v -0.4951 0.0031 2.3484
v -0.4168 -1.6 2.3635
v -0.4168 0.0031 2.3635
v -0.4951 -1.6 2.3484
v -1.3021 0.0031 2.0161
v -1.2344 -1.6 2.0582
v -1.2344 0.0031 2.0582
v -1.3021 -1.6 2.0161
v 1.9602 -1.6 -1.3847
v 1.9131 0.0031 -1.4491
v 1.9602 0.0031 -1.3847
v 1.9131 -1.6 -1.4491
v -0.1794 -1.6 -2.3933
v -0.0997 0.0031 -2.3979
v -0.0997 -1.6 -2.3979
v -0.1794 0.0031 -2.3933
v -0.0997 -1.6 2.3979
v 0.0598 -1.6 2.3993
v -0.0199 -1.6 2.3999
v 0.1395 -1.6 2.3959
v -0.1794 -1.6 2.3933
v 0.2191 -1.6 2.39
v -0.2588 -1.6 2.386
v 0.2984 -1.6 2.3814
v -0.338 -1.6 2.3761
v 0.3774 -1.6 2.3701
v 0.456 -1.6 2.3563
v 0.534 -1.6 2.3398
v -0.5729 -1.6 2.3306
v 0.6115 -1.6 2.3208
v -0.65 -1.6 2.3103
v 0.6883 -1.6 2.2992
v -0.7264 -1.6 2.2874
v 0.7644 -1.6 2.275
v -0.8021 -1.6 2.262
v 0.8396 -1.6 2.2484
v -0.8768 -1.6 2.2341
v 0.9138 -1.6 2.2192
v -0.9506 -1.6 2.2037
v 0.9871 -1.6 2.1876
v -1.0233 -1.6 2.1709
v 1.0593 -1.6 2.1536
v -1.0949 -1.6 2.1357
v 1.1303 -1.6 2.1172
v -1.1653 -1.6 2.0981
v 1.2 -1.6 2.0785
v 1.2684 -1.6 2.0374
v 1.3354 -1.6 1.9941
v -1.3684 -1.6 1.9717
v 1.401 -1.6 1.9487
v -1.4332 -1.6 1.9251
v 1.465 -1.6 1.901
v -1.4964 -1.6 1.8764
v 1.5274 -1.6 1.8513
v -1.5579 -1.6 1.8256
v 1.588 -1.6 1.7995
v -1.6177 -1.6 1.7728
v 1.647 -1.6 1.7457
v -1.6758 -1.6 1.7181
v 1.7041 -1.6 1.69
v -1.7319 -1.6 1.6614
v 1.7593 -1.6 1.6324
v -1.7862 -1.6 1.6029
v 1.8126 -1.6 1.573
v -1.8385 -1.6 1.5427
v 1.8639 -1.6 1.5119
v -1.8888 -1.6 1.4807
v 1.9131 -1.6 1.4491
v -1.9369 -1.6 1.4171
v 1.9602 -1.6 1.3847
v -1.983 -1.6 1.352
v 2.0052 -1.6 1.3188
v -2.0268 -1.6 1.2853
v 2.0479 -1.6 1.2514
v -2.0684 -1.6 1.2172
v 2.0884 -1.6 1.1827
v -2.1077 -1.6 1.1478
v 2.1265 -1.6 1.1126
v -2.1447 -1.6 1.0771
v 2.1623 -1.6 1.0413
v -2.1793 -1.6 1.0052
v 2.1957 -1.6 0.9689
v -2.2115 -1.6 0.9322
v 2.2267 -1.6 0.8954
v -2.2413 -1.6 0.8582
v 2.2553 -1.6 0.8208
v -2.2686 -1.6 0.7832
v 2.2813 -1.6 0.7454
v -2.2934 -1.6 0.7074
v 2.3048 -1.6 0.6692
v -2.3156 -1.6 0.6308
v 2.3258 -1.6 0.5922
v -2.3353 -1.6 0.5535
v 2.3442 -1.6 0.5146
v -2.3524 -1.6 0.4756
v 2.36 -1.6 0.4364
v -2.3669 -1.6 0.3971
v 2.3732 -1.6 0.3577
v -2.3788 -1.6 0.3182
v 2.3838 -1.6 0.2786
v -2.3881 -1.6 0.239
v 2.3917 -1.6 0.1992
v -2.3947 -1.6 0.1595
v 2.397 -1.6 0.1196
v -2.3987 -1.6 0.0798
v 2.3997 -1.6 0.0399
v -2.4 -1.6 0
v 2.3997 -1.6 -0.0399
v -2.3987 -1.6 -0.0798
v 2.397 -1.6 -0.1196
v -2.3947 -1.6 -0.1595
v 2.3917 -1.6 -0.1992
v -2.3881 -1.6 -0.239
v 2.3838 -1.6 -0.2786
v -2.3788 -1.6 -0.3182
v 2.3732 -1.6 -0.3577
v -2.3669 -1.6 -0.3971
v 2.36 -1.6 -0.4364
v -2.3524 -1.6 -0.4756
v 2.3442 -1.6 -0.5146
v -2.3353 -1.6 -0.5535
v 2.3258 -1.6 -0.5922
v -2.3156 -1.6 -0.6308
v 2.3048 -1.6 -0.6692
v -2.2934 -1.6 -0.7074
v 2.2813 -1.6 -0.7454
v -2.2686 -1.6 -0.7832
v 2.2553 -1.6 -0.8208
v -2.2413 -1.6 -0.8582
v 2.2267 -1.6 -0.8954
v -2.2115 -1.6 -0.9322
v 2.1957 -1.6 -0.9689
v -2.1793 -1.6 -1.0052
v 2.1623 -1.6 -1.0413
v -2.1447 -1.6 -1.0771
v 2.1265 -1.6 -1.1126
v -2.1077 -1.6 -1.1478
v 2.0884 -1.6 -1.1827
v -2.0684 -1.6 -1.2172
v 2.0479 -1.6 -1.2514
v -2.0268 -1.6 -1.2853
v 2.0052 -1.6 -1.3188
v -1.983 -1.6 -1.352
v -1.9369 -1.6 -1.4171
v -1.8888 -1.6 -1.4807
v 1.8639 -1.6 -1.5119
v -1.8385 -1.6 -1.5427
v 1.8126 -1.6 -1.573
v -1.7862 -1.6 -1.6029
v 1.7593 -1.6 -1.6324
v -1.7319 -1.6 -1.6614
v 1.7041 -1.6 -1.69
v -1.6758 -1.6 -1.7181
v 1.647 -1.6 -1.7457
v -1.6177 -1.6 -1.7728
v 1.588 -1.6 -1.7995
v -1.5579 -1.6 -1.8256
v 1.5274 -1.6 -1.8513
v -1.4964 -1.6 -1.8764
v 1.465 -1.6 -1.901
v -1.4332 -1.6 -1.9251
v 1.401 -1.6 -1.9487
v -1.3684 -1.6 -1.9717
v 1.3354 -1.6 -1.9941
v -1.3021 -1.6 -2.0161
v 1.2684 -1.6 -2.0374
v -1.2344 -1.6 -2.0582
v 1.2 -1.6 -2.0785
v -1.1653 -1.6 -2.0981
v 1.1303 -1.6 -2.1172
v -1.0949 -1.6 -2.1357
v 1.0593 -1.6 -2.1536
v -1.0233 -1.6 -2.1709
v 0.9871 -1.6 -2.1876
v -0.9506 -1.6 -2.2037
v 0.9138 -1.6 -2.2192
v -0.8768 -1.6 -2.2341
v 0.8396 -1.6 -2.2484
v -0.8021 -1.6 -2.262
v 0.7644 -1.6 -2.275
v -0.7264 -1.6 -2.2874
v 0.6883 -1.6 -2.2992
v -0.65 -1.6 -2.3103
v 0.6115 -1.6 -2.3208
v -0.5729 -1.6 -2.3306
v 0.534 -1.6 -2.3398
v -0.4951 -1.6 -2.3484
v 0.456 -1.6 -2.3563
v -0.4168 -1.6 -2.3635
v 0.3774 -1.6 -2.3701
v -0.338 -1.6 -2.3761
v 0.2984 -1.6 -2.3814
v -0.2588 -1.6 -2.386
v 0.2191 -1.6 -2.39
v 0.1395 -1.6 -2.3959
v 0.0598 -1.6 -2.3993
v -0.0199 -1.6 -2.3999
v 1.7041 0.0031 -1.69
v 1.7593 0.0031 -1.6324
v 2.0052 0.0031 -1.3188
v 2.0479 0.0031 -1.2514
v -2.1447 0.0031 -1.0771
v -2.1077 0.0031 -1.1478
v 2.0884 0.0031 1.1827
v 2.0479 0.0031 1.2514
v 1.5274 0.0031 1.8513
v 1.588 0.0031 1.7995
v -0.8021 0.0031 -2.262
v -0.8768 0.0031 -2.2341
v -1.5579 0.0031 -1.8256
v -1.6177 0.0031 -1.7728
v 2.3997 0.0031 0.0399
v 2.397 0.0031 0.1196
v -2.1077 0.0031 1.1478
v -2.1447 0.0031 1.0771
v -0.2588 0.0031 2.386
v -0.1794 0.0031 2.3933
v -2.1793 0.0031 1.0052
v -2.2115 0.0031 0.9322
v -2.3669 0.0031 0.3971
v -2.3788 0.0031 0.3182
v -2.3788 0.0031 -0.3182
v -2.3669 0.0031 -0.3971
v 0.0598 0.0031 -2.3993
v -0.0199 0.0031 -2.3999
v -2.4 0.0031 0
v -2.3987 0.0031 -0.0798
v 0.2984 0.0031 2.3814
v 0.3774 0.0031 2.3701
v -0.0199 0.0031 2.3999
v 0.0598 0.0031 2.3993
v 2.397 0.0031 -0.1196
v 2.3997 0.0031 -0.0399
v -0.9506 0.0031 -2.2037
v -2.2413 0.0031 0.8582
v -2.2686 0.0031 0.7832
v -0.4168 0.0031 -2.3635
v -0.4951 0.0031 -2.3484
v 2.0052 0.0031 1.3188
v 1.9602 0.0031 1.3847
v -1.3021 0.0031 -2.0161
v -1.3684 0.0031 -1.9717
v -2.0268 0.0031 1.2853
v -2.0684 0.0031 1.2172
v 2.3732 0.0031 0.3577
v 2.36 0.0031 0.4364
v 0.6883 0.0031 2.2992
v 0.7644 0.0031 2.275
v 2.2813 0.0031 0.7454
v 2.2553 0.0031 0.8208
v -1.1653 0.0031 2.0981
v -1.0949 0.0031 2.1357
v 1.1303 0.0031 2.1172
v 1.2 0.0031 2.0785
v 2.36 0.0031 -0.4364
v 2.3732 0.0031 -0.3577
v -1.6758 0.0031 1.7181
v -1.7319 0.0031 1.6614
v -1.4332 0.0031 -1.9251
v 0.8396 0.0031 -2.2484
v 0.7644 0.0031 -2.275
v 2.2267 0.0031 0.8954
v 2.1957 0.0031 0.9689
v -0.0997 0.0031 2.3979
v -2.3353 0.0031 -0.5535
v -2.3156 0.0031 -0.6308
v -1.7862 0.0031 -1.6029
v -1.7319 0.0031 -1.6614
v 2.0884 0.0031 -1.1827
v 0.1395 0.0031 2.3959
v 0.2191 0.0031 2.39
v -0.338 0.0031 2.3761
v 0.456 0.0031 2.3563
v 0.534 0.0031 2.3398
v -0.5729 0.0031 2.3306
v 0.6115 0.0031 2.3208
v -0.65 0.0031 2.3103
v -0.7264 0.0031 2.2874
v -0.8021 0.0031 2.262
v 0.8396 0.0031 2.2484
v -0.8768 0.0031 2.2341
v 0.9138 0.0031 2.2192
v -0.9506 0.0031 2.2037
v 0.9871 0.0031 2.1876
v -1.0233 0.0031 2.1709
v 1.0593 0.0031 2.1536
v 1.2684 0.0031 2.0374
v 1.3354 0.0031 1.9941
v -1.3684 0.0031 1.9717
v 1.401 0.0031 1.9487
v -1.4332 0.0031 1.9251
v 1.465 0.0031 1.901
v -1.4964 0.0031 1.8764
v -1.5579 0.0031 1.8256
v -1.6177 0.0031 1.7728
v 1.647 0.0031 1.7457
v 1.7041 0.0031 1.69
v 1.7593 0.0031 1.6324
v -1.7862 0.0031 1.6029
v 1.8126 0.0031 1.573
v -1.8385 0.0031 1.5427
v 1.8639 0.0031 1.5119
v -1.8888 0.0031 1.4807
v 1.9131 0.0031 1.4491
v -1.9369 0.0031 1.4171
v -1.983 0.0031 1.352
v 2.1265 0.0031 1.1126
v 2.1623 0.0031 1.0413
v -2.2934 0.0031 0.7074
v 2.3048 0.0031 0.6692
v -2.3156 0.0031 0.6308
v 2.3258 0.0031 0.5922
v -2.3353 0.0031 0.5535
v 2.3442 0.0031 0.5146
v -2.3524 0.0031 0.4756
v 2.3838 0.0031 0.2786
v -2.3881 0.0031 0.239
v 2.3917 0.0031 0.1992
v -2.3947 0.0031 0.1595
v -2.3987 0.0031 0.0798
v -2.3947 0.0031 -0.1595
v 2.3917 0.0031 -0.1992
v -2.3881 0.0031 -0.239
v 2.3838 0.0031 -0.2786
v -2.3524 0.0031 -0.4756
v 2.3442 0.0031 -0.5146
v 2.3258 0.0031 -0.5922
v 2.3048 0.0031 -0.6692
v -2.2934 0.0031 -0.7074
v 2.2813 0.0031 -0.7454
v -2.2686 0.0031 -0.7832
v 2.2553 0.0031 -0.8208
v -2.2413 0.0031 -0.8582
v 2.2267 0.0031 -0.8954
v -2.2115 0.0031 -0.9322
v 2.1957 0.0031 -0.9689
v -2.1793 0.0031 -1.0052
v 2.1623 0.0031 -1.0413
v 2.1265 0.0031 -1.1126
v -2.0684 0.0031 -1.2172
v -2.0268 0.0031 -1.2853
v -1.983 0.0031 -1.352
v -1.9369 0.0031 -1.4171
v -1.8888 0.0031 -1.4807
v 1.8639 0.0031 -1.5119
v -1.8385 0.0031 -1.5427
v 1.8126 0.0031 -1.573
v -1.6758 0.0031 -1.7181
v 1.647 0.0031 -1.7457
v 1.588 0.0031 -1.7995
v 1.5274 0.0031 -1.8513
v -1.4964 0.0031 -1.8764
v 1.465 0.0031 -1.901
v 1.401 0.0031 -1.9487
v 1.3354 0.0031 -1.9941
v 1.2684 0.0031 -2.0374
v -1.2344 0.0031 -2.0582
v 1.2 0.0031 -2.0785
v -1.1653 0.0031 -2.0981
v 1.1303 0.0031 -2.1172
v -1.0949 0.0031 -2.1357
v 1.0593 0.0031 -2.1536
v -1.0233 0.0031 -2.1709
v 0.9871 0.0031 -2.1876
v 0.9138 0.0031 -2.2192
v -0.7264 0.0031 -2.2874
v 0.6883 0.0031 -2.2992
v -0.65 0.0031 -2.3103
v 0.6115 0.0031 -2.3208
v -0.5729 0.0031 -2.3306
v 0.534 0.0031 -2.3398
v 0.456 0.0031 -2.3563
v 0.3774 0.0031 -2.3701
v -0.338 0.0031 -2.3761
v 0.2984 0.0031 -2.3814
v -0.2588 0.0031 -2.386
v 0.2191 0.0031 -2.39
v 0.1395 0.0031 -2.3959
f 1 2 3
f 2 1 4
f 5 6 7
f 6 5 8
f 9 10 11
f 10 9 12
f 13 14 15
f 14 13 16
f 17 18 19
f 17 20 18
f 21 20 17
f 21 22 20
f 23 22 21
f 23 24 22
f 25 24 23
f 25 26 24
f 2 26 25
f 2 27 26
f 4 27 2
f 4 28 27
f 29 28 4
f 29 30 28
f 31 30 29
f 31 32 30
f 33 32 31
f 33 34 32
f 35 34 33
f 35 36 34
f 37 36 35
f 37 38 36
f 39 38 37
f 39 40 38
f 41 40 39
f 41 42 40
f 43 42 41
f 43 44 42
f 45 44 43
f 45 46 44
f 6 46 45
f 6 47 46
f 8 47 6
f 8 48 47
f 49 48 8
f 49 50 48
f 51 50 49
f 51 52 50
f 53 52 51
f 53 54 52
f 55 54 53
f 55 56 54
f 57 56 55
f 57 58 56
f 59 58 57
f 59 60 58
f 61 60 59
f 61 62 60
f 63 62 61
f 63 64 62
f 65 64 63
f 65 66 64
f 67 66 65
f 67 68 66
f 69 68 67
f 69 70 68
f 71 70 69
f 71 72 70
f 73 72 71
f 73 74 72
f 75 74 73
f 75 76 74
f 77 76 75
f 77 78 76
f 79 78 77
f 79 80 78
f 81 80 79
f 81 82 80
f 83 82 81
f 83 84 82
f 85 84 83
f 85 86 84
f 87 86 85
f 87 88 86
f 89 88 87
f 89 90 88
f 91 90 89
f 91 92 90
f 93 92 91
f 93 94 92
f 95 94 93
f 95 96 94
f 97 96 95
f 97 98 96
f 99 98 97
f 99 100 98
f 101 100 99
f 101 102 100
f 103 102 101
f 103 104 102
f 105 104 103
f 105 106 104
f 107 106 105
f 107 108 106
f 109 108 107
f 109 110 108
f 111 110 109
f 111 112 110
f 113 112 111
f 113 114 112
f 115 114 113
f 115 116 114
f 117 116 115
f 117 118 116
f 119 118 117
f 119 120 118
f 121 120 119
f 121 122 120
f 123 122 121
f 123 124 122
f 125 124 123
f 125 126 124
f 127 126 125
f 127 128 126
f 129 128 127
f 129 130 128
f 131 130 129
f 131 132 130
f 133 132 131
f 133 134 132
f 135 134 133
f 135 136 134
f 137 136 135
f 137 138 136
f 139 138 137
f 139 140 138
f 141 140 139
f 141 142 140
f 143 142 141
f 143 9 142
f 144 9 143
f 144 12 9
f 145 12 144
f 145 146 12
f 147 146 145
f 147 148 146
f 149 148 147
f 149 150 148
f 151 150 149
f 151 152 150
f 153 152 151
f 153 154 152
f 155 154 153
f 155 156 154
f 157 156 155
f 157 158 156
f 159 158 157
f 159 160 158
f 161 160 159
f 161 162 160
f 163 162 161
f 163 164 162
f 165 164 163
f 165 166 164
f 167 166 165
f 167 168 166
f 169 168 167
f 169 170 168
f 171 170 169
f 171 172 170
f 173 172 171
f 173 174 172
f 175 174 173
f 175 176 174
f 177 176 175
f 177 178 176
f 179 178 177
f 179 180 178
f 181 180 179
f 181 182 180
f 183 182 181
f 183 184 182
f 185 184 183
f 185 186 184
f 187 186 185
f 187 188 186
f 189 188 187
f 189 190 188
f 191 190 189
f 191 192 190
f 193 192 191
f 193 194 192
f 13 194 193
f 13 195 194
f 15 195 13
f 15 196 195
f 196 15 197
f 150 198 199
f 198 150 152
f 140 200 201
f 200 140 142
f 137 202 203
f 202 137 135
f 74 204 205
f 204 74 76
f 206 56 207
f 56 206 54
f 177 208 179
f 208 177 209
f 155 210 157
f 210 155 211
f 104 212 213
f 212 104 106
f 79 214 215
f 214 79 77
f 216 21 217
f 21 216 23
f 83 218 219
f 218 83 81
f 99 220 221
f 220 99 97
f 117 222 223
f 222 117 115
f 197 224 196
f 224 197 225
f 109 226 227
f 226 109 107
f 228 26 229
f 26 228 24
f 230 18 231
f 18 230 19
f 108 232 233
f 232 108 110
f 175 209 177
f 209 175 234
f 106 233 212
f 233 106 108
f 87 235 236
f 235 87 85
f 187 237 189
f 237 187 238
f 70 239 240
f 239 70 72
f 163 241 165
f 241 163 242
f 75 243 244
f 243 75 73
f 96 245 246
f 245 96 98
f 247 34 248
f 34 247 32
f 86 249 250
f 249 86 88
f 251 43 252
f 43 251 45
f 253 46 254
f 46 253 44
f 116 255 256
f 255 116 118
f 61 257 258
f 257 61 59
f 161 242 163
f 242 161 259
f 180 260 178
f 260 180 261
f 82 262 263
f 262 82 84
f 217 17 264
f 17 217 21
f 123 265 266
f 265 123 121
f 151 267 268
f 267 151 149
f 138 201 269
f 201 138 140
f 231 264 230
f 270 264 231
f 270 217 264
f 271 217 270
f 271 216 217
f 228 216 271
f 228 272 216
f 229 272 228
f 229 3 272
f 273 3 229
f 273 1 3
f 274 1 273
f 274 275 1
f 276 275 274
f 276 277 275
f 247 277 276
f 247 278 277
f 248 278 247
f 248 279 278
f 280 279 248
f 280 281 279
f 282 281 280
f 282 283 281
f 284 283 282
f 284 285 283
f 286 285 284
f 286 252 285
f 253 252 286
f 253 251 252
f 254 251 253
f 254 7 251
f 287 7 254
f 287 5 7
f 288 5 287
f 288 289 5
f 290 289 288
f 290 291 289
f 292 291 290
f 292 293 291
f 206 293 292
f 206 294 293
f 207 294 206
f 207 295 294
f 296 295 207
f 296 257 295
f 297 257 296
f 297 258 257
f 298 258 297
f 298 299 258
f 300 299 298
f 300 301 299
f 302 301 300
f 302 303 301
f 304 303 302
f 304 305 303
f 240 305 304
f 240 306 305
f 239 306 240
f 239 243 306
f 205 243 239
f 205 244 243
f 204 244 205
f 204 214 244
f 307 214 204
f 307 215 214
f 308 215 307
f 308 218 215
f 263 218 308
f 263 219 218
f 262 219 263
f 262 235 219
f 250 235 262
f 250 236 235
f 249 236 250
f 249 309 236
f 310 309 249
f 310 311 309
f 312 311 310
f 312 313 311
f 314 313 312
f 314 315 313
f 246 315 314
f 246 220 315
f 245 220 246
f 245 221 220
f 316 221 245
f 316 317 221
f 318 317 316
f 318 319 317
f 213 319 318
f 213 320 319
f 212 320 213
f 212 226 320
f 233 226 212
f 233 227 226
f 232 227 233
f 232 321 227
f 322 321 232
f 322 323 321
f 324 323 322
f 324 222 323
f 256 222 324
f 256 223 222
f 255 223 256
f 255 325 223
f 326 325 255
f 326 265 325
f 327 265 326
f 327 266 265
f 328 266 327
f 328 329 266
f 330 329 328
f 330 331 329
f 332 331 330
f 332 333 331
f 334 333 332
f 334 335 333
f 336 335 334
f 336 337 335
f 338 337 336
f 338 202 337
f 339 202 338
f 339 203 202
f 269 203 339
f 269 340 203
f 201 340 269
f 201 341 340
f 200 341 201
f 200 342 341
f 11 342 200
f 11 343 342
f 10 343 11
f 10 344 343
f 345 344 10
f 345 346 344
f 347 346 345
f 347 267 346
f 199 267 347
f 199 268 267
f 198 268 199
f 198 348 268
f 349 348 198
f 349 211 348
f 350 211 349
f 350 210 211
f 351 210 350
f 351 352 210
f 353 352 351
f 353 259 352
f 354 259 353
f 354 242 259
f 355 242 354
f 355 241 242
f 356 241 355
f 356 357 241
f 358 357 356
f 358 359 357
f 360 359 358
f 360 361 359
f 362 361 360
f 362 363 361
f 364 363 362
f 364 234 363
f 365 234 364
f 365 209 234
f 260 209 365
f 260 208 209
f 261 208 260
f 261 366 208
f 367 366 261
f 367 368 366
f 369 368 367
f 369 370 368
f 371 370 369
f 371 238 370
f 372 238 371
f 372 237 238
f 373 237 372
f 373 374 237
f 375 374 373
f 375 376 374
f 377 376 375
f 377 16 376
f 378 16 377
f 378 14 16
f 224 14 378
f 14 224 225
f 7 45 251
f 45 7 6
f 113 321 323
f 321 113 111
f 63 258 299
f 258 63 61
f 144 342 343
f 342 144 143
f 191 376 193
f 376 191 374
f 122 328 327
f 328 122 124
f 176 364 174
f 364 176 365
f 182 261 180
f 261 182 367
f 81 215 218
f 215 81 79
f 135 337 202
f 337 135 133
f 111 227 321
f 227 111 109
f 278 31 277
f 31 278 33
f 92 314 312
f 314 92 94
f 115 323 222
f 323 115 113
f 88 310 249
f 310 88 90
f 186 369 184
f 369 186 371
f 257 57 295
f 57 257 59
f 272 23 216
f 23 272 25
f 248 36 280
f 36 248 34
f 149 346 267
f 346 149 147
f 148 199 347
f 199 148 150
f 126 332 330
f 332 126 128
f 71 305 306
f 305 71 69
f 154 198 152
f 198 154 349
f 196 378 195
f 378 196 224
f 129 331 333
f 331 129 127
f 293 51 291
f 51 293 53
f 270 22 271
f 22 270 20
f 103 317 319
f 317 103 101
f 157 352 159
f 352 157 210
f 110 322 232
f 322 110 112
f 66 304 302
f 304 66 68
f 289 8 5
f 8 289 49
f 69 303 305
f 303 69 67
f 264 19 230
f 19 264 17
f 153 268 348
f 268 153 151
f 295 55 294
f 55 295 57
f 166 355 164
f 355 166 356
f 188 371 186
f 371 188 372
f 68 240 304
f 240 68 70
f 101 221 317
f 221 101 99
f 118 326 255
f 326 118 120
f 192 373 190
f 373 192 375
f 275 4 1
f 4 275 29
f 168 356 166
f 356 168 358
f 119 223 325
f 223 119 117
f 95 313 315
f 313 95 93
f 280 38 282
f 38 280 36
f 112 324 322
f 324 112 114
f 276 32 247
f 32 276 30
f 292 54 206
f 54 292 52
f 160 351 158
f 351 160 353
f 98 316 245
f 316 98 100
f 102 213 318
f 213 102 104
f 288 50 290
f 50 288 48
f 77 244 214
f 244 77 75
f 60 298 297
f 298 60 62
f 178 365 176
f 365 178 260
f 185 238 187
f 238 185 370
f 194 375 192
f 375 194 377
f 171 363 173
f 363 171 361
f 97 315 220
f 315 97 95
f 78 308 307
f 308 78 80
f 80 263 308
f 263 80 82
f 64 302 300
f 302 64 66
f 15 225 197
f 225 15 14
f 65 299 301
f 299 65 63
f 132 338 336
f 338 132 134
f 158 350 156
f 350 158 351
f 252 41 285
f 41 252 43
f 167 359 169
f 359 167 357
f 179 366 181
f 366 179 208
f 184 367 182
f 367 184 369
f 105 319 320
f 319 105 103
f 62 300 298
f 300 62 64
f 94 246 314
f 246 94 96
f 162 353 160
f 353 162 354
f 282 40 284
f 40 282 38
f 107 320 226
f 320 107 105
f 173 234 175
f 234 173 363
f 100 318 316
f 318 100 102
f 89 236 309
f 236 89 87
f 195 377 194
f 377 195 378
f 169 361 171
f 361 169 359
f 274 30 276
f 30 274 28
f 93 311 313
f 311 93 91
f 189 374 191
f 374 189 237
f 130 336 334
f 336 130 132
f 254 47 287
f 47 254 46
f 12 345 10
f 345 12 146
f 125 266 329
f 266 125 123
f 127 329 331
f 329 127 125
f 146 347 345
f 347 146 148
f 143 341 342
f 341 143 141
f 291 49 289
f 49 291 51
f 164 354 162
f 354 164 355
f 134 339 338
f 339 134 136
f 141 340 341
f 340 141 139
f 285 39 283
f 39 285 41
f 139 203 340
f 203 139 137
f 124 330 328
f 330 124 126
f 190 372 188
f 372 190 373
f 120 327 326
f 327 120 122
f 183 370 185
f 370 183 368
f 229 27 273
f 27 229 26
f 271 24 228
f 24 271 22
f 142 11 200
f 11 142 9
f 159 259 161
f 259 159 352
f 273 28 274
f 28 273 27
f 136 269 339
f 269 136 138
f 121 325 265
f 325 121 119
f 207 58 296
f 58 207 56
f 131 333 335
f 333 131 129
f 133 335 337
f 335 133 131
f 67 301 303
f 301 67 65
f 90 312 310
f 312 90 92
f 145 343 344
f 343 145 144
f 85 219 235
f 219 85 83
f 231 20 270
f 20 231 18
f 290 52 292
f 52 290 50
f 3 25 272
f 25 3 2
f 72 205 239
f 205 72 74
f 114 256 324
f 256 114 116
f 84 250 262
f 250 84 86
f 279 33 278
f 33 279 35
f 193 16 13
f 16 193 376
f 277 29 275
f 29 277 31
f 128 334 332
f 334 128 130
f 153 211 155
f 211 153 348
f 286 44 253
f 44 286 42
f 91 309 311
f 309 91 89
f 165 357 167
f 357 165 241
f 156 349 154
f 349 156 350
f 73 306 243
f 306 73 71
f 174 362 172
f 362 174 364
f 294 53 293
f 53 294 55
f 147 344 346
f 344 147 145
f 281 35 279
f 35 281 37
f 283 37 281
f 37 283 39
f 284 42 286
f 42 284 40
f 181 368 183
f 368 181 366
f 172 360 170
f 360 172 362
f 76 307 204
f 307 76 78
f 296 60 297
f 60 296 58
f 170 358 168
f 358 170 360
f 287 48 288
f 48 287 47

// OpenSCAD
use <../lib.scad>
use <4363.scad>
$fa=1; $fs=0.2;
function ldraw_lib__u9161(realsolid=false) = [
// 0 ~Moved to 4363
// 0 Name: u9161.dat
// 0 Author: [PTadmin]
// 0 !LDRAW_ORG Part UPDATE 2012-03
// 0 !LICENSE Licensed under CC BY 4.0 : see CAreadme.txt
// 
// 0 BFC CERTIFY CCW
  [0,"BFC","CERTIFY"],
  [0,"BFC","CCW"],
// 
// 0 !HISTORY 2012-12-28 [PTadmin] Official Update 2012-03
// 
// 
// 0 // ~Wheel 6 x 20 with 10 Spokes
// 1 16 0 0 0 1 0 0 0 1 0 0 0 1 4363.dat
  [1,16,0,0,0,1,0,0,0,1,0,0,0,1, ldraw_lib__4363(realsolid)],
];
module ldraw_lib__u9161(step=0, col=false, unit=2/5, alt=false, line=0.2, solid=!$preview)
    makepoly(ldraw_lib__u9161(solid), step=step, col=col, unit=unit, alt=alt, line=line, solid=solid);
ldraw_lib__u9161(line=0.2);
